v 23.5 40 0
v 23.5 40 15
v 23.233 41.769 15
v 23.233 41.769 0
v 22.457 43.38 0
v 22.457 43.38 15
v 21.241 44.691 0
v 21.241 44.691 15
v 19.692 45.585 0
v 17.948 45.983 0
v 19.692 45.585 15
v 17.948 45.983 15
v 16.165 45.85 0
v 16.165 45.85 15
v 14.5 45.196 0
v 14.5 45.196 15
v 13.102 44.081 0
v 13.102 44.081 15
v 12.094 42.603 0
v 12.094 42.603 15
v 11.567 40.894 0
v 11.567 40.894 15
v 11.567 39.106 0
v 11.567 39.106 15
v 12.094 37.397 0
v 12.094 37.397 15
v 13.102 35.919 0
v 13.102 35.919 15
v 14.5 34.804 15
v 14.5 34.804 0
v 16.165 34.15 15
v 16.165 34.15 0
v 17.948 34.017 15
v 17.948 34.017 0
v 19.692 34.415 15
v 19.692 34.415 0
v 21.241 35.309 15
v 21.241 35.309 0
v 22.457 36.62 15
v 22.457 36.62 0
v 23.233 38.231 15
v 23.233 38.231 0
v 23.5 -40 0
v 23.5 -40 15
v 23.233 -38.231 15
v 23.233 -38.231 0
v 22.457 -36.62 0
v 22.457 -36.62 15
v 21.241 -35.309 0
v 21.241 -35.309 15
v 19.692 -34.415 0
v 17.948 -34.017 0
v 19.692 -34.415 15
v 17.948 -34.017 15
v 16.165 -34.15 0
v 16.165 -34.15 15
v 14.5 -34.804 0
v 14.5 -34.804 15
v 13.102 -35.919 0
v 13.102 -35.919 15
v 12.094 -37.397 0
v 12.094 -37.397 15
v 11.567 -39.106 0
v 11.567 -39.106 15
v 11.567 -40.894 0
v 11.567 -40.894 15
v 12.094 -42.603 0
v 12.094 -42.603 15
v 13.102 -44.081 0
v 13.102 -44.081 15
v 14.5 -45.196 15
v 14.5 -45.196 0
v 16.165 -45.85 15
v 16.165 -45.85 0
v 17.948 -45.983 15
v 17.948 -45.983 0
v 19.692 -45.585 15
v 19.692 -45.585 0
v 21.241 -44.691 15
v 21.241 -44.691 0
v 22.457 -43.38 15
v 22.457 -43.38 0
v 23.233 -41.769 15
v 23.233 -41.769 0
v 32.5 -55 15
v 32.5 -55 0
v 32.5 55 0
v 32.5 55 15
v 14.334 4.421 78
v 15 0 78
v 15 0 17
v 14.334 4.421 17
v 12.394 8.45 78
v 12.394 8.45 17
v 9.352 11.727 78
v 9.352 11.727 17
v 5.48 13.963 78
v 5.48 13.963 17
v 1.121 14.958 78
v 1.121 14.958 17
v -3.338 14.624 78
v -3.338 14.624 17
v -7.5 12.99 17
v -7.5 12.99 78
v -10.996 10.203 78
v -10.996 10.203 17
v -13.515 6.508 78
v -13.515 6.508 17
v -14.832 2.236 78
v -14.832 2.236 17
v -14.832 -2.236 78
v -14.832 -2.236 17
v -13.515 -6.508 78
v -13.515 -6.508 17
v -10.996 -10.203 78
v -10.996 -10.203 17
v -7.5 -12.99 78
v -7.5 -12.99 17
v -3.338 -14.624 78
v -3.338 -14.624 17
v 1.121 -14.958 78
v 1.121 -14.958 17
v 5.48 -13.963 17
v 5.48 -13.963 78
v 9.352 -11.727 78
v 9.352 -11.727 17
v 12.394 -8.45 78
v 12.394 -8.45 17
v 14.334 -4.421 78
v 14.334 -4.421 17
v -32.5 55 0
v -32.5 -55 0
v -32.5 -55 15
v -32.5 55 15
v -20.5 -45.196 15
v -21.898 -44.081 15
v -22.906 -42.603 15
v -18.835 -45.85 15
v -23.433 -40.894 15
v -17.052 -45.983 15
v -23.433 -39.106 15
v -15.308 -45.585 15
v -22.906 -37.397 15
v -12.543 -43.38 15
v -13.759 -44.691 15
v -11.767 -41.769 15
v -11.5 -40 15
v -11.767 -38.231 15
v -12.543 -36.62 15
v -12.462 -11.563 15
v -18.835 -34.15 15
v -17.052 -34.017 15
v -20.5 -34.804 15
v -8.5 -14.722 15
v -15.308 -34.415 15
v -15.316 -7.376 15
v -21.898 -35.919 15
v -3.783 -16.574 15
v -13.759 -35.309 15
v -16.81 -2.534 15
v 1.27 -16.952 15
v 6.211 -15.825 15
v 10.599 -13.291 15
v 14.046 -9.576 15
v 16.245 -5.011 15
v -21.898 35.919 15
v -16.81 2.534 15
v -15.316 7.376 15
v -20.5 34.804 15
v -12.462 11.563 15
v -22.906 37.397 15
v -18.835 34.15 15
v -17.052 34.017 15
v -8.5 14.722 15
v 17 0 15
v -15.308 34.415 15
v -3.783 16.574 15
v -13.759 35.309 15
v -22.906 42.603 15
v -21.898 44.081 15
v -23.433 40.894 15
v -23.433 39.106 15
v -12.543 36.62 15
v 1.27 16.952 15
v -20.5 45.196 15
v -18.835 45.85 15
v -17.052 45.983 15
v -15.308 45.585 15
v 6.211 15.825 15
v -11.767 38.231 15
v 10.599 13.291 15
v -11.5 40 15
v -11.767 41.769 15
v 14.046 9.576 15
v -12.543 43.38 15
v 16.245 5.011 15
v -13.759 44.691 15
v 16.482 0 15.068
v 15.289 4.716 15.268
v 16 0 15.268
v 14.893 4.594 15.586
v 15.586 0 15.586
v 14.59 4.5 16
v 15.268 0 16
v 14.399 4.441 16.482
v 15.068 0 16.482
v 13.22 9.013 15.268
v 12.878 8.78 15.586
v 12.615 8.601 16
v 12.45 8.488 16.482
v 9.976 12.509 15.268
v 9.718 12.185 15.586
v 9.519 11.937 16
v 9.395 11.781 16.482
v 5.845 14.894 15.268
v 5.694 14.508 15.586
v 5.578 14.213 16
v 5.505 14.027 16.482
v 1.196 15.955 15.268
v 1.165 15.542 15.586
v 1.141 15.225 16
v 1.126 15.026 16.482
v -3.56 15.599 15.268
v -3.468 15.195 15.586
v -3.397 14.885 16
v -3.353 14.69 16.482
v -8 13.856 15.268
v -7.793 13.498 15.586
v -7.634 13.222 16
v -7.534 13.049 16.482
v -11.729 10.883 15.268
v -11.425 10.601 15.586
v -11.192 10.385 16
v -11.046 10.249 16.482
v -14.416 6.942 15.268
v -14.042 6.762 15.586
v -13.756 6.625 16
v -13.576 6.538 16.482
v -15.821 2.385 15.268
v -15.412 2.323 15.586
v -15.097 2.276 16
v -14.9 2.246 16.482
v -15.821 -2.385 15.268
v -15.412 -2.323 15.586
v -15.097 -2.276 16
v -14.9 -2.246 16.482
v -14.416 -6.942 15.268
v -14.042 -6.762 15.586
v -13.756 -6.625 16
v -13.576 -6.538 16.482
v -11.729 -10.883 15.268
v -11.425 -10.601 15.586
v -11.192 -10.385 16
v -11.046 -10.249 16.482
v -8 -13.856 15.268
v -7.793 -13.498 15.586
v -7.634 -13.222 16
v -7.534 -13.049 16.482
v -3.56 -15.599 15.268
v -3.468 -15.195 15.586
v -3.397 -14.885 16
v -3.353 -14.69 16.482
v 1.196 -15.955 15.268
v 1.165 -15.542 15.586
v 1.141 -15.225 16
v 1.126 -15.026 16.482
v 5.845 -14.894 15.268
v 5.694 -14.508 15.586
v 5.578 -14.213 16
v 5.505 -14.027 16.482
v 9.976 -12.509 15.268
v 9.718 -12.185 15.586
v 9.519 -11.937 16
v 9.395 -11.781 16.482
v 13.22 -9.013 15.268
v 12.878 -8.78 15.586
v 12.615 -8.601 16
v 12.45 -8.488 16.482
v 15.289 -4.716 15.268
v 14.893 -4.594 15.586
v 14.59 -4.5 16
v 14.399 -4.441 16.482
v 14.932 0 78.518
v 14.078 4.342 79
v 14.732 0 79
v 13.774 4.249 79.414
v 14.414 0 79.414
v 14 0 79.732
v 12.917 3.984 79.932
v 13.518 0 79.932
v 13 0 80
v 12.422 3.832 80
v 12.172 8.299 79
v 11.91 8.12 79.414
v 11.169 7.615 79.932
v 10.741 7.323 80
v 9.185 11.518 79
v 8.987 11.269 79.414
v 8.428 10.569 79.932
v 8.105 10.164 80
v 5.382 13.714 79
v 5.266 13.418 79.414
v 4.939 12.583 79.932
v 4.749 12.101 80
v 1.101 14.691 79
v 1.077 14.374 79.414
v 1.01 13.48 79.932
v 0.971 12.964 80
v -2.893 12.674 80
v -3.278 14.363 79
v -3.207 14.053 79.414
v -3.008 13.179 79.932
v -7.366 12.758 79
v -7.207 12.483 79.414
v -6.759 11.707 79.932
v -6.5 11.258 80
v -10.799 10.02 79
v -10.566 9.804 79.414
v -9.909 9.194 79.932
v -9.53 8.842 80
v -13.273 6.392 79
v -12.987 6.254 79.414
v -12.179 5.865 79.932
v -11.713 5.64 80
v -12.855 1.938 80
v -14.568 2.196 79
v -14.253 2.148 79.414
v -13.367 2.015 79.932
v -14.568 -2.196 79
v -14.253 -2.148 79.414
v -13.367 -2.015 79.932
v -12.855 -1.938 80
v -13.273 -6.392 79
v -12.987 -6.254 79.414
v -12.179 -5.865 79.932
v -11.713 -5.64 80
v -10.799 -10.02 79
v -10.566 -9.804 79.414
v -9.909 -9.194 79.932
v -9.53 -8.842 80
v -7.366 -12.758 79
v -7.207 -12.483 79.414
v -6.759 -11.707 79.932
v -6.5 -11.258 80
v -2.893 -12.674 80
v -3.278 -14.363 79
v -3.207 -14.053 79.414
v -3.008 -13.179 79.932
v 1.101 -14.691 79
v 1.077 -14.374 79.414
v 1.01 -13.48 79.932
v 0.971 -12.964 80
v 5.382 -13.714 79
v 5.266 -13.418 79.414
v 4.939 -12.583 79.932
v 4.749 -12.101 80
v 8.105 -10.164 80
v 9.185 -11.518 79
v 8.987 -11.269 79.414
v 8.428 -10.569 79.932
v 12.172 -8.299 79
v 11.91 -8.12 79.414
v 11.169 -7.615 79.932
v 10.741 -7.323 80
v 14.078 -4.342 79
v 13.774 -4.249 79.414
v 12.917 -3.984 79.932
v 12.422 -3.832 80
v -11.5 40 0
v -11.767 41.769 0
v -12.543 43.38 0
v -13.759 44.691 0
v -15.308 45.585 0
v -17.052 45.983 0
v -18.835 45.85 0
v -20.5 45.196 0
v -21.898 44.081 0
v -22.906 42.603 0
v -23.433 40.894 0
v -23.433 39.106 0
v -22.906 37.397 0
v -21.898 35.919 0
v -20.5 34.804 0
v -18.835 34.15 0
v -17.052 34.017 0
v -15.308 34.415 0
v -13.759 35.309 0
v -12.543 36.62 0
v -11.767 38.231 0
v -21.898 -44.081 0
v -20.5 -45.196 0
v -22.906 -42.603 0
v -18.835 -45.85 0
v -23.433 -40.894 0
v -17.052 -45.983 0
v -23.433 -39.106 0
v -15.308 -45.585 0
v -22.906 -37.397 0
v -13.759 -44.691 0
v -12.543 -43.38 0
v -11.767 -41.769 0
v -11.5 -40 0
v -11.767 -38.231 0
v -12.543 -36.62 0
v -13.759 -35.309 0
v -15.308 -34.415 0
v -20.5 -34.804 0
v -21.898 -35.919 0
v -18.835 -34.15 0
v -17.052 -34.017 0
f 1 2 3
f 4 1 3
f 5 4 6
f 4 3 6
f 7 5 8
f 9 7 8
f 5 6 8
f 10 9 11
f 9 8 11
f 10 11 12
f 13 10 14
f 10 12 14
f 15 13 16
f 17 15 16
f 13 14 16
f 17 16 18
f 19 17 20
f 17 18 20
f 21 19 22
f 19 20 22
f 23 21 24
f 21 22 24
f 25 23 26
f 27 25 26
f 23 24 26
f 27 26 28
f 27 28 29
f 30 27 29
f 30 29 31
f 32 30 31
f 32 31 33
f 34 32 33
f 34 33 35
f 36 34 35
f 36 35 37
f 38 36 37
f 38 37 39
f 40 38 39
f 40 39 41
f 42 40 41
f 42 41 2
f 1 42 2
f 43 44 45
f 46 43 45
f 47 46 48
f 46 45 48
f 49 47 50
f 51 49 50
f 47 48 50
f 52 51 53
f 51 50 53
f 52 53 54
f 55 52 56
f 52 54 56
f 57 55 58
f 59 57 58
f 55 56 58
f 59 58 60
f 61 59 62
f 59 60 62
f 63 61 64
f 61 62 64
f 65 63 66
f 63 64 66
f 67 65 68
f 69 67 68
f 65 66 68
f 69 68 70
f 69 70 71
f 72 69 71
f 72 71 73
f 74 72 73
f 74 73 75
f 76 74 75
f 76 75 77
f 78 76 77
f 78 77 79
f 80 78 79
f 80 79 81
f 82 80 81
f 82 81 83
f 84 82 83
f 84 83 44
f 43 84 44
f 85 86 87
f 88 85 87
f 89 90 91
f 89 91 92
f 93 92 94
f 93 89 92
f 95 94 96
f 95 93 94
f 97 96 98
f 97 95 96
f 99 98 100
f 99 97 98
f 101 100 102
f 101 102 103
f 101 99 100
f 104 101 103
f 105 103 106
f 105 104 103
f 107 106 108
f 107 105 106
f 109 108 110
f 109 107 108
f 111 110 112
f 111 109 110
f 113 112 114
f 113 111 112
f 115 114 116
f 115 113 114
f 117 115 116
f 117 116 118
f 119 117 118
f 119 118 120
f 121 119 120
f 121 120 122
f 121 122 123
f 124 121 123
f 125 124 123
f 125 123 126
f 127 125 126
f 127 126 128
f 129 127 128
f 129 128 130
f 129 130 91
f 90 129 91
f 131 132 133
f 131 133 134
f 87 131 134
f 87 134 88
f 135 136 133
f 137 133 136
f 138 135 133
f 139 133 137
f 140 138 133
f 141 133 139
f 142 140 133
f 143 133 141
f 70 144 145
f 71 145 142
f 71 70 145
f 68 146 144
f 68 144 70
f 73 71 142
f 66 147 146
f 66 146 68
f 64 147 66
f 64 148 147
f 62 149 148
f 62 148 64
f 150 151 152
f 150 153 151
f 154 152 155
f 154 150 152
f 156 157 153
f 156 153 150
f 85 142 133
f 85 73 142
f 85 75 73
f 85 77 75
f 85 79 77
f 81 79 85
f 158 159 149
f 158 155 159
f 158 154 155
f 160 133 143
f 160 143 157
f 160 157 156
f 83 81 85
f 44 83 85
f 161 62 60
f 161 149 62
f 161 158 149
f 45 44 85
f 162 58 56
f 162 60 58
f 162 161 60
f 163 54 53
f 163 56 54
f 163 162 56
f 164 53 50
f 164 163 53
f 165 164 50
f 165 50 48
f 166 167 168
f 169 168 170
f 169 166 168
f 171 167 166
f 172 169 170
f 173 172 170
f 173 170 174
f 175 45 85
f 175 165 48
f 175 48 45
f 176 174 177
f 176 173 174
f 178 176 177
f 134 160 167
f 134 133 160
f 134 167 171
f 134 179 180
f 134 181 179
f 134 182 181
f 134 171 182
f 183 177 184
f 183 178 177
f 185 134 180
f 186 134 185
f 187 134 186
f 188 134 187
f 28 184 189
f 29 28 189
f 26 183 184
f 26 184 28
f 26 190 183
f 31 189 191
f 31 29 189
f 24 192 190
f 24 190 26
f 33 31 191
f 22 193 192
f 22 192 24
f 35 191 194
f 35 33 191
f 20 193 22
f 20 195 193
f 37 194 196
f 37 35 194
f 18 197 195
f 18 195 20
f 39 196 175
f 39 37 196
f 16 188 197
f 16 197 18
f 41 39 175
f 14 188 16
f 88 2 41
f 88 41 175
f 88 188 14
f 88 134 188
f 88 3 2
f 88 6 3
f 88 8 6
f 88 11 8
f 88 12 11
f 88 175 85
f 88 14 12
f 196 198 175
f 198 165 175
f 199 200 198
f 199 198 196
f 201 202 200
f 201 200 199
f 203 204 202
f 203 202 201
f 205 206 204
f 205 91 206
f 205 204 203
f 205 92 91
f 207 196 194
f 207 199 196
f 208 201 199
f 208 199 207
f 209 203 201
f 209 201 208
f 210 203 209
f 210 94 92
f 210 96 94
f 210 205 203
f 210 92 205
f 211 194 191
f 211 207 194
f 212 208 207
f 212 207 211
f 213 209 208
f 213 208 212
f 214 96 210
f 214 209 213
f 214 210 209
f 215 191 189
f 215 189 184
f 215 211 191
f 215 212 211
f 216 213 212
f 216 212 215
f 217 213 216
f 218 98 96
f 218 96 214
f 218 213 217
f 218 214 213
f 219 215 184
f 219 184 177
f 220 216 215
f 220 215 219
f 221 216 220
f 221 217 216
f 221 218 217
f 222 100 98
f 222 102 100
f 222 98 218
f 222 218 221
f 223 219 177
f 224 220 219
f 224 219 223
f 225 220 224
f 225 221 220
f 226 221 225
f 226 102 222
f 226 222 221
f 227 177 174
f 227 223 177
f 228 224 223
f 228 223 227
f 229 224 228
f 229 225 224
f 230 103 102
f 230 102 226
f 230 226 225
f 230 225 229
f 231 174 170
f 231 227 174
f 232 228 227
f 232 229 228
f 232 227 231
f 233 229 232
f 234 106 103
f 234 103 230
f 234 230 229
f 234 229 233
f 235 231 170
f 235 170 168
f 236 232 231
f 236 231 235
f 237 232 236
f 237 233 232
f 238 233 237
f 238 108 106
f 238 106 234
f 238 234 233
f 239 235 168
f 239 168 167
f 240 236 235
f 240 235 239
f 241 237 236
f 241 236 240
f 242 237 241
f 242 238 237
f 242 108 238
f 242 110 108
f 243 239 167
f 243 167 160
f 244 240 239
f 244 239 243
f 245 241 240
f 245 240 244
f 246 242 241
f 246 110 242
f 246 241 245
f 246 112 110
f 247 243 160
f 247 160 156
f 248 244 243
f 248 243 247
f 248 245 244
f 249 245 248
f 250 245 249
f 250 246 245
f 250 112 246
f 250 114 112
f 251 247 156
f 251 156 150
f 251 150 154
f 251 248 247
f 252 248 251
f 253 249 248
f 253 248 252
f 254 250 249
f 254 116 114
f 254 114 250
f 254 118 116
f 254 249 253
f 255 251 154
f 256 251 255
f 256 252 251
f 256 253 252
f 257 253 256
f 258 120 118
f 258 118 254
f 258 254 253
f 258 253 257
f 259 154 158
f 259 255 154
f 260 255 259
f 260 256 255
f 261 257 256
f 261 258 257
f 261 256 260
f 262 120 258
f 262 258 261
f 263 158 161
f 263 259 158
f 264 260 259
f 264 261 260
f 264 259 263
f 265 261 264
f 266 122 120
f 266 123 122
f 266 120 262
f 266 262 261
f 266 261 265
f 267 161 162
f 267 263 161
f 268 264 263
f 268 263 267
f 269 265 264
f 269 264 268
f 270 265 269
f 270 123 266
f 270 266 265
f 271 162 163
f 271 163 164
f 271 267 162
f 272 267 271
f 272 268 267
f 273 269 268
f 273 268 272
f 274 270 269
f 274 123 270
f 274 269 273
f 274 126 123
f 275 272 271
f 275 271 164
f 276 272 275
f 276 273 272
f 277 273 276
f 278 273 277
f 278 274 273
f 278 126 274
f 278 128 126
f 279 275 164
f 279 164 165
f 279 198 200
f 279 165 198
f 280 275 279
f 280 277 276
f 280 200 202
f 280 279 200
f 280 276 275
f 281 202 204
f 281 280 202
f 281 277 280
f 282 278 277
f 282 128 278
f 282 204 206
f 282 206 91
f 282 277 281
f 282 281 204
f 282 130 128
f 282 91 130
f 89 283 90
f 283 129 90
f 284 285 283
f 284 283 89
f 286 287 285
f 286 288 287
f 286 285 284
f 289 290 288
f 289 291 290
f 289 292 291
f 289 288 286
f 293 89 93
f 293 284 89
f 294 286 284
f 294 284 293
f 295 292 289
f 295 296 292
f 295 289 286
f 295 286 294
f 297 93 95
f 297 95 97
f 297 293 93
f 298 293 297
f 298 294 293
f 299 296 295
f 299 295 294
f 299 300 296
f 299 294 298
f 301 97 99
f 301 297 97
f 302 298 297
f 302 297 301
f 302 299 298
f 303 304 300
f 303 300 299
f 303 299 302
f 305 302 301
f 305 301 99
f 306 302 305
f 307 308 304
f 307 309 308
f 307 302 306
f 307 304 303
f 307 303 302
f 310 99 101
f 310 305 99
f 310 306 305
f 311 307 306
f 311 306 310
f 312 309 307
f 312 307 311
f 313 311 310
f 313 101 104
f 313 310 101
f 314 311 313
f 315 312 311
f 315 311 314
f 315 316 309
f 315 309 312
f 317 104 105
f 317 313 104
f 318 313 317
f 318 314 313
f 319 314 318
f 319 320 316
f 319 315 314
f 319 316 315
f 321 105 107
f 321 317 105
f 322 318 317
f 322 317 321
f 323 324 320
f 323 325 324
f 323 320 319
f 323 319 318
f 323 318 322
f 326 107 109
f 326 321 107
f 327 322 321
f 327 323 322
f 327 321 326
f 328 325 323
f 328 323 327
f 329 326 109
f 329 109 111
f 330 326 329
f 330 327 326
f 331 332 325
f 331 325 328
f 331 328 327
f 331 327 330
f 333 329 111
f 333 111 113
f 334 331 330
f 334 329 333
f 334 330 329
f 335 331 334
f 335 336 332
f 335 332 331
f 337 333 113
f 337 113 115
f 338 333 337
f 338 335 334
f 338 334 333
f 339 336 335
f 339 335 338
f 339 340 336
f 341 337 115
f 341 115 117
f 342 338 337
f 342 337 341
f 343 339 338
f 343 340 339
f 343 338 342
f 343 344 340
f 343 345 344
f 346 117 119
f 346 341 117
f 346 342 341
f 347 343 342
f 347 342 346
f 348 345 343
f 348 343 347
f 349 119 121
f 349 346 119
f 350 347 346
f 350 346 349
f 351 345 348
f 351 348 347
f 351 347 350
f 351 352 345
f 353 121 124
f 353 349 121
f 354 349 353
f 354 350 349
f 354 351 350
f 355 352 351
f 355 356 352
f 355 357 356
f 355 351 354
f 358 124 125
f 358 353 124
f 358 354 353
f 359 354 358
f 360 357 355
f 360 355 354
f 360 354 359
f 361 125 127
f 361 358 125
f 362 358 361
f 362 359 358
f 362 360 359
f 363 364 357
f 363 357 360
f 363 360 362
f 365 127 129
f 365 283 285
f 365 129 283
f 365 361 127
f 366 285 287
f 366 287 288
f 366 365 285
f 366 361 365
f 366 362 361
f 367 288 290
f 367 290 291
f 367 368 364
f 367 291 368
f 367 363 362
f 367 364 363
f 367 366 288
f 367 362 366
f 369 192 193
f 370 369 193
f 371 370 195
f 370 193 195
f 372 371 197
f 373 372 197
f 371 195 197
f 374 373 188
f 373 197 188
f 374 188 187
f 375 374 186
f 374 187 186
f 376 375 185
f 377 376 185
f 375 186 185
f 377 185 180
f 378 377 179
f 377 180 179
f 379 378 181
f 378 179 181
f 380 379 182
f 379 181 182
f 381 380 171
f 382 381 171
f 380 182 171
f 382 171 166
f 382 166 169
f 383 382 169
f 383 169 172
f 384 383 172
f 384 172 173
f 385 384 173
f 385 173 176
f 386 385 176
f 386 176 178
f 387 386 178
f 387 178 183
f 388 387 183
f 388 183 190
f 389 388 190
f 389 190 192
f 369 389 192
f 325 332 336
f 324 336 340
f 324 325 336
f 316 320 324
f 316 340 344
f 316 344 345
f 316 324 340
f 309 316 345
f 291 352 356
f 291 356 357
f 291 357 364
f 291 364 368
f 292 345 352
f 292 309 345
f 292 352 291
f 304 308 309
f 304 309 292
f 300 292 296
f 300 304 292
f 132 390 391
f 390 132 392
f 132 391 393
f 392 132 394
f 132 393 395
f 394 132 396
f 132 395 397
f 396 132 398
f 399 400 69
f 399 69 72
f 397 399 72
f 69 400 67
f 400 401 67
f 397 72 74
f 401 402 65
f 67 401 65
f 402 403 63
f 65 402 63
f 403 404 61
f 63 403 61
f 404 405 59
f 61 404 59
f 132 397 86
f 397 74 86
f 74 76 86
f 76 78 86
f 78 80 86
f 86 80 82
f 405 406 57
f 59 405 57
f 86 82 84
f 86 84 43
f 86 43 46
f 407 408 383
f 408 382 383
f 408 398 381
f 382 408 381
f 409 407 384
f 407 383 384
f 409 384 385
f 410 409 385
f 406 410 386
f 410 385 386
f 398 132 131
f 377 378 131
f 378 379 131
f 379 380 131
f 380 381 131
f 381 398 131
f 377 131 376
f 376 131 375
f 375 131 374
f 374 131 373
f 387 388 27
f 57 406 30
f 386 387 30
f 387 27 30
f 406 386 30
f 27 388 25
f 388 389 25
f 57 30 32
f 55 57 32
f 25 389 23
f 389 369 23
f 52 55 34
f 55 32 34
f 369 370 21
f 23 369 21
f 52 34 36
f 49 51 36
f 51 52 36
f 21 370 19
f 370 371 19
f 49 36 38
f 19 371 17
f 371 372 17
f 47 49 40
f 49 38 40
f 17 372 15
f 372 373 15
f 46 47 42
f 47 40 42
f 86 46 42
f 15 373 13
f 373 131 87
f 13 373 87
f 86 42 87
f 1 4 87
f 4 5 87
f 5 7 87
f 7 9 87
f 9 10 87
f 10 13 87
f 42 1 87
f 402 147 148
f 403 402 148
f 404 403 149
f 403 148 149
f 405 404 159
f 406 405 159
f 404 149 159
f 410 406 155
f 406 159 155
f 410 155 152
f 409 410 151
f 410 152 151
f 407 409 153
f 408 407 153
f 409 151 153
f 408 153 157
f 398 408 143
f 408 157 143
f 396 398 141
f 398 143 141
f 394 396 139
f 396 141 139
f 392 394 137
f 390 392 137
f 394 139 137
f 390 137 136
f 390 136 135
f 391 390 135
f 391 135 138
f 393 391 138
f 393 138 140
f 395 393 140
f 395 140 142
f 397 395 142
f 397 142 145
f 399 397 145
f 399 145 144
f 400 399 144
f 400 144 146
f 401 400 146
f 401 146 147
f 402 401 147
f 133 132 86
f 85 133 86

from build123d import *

# Parameters (mm, degrees)
F0_W      = 65
F0_H      = 110
F1_DEPTH  = 100
F2_W      = 65
F2_H      = 110
F2_R      = 15
F3_DEPTH  = 85
F1_FACE_R = 15
F4_DEPTH  = 20
F5_R      = 6
F6_DEPTH  = 30
F7_R      = 2


with BuildPart() as f1:
    # F0 (on Top) → F1 (new body)
    with BuildSketch(Plane.XY):
        Rectangle(F0_W, F0_H)
    extrude(amount=F1_DEPTH)

    # F2 (on face) → F3 (cut)
    with BuildSketch(Plane.XY.offset(100)):
        Rectangle(F2_W, F2_H)
        Circle(F2_R, mode=Mode.SUBTRACT)
    extrude(amount=-F3_DEPTH, mode=Mode.SUBTRACT)

    # F1_face (on face) → F4 (cut)
    with BuildSketch(Plane.XY.offset(100)):
        Circle(F1_FACE_R)
    extrude(amount=-F4_DEPTH, mode=Mode.SUBTRACT)

    # F5 (on face) → F6 (cut)
    with BuildSketch(Plane.XY.offset(15)):
        with Locations((-17.5, 40)):
            Circle(F5_R)
        with Locations((17.500002, 40)):
            Circle(F5_R)
        with Locations((17.500002, -40)):
            Circle(F5_R)
        with Locations((-17.5, -40)):
            Circle(F5_R)
    extrude(amount=-F6_DEPTH, mode=Mode.SUBTRACT)

    # F7
    f7_edges = [f1.edges().sort_by_distance(p)[0] for p in [
        (-15, 0, 80),
        (-15, 0, 15),
    ]]
    fillet(f7_edges, radius=F7_R)


solid = f1.part
